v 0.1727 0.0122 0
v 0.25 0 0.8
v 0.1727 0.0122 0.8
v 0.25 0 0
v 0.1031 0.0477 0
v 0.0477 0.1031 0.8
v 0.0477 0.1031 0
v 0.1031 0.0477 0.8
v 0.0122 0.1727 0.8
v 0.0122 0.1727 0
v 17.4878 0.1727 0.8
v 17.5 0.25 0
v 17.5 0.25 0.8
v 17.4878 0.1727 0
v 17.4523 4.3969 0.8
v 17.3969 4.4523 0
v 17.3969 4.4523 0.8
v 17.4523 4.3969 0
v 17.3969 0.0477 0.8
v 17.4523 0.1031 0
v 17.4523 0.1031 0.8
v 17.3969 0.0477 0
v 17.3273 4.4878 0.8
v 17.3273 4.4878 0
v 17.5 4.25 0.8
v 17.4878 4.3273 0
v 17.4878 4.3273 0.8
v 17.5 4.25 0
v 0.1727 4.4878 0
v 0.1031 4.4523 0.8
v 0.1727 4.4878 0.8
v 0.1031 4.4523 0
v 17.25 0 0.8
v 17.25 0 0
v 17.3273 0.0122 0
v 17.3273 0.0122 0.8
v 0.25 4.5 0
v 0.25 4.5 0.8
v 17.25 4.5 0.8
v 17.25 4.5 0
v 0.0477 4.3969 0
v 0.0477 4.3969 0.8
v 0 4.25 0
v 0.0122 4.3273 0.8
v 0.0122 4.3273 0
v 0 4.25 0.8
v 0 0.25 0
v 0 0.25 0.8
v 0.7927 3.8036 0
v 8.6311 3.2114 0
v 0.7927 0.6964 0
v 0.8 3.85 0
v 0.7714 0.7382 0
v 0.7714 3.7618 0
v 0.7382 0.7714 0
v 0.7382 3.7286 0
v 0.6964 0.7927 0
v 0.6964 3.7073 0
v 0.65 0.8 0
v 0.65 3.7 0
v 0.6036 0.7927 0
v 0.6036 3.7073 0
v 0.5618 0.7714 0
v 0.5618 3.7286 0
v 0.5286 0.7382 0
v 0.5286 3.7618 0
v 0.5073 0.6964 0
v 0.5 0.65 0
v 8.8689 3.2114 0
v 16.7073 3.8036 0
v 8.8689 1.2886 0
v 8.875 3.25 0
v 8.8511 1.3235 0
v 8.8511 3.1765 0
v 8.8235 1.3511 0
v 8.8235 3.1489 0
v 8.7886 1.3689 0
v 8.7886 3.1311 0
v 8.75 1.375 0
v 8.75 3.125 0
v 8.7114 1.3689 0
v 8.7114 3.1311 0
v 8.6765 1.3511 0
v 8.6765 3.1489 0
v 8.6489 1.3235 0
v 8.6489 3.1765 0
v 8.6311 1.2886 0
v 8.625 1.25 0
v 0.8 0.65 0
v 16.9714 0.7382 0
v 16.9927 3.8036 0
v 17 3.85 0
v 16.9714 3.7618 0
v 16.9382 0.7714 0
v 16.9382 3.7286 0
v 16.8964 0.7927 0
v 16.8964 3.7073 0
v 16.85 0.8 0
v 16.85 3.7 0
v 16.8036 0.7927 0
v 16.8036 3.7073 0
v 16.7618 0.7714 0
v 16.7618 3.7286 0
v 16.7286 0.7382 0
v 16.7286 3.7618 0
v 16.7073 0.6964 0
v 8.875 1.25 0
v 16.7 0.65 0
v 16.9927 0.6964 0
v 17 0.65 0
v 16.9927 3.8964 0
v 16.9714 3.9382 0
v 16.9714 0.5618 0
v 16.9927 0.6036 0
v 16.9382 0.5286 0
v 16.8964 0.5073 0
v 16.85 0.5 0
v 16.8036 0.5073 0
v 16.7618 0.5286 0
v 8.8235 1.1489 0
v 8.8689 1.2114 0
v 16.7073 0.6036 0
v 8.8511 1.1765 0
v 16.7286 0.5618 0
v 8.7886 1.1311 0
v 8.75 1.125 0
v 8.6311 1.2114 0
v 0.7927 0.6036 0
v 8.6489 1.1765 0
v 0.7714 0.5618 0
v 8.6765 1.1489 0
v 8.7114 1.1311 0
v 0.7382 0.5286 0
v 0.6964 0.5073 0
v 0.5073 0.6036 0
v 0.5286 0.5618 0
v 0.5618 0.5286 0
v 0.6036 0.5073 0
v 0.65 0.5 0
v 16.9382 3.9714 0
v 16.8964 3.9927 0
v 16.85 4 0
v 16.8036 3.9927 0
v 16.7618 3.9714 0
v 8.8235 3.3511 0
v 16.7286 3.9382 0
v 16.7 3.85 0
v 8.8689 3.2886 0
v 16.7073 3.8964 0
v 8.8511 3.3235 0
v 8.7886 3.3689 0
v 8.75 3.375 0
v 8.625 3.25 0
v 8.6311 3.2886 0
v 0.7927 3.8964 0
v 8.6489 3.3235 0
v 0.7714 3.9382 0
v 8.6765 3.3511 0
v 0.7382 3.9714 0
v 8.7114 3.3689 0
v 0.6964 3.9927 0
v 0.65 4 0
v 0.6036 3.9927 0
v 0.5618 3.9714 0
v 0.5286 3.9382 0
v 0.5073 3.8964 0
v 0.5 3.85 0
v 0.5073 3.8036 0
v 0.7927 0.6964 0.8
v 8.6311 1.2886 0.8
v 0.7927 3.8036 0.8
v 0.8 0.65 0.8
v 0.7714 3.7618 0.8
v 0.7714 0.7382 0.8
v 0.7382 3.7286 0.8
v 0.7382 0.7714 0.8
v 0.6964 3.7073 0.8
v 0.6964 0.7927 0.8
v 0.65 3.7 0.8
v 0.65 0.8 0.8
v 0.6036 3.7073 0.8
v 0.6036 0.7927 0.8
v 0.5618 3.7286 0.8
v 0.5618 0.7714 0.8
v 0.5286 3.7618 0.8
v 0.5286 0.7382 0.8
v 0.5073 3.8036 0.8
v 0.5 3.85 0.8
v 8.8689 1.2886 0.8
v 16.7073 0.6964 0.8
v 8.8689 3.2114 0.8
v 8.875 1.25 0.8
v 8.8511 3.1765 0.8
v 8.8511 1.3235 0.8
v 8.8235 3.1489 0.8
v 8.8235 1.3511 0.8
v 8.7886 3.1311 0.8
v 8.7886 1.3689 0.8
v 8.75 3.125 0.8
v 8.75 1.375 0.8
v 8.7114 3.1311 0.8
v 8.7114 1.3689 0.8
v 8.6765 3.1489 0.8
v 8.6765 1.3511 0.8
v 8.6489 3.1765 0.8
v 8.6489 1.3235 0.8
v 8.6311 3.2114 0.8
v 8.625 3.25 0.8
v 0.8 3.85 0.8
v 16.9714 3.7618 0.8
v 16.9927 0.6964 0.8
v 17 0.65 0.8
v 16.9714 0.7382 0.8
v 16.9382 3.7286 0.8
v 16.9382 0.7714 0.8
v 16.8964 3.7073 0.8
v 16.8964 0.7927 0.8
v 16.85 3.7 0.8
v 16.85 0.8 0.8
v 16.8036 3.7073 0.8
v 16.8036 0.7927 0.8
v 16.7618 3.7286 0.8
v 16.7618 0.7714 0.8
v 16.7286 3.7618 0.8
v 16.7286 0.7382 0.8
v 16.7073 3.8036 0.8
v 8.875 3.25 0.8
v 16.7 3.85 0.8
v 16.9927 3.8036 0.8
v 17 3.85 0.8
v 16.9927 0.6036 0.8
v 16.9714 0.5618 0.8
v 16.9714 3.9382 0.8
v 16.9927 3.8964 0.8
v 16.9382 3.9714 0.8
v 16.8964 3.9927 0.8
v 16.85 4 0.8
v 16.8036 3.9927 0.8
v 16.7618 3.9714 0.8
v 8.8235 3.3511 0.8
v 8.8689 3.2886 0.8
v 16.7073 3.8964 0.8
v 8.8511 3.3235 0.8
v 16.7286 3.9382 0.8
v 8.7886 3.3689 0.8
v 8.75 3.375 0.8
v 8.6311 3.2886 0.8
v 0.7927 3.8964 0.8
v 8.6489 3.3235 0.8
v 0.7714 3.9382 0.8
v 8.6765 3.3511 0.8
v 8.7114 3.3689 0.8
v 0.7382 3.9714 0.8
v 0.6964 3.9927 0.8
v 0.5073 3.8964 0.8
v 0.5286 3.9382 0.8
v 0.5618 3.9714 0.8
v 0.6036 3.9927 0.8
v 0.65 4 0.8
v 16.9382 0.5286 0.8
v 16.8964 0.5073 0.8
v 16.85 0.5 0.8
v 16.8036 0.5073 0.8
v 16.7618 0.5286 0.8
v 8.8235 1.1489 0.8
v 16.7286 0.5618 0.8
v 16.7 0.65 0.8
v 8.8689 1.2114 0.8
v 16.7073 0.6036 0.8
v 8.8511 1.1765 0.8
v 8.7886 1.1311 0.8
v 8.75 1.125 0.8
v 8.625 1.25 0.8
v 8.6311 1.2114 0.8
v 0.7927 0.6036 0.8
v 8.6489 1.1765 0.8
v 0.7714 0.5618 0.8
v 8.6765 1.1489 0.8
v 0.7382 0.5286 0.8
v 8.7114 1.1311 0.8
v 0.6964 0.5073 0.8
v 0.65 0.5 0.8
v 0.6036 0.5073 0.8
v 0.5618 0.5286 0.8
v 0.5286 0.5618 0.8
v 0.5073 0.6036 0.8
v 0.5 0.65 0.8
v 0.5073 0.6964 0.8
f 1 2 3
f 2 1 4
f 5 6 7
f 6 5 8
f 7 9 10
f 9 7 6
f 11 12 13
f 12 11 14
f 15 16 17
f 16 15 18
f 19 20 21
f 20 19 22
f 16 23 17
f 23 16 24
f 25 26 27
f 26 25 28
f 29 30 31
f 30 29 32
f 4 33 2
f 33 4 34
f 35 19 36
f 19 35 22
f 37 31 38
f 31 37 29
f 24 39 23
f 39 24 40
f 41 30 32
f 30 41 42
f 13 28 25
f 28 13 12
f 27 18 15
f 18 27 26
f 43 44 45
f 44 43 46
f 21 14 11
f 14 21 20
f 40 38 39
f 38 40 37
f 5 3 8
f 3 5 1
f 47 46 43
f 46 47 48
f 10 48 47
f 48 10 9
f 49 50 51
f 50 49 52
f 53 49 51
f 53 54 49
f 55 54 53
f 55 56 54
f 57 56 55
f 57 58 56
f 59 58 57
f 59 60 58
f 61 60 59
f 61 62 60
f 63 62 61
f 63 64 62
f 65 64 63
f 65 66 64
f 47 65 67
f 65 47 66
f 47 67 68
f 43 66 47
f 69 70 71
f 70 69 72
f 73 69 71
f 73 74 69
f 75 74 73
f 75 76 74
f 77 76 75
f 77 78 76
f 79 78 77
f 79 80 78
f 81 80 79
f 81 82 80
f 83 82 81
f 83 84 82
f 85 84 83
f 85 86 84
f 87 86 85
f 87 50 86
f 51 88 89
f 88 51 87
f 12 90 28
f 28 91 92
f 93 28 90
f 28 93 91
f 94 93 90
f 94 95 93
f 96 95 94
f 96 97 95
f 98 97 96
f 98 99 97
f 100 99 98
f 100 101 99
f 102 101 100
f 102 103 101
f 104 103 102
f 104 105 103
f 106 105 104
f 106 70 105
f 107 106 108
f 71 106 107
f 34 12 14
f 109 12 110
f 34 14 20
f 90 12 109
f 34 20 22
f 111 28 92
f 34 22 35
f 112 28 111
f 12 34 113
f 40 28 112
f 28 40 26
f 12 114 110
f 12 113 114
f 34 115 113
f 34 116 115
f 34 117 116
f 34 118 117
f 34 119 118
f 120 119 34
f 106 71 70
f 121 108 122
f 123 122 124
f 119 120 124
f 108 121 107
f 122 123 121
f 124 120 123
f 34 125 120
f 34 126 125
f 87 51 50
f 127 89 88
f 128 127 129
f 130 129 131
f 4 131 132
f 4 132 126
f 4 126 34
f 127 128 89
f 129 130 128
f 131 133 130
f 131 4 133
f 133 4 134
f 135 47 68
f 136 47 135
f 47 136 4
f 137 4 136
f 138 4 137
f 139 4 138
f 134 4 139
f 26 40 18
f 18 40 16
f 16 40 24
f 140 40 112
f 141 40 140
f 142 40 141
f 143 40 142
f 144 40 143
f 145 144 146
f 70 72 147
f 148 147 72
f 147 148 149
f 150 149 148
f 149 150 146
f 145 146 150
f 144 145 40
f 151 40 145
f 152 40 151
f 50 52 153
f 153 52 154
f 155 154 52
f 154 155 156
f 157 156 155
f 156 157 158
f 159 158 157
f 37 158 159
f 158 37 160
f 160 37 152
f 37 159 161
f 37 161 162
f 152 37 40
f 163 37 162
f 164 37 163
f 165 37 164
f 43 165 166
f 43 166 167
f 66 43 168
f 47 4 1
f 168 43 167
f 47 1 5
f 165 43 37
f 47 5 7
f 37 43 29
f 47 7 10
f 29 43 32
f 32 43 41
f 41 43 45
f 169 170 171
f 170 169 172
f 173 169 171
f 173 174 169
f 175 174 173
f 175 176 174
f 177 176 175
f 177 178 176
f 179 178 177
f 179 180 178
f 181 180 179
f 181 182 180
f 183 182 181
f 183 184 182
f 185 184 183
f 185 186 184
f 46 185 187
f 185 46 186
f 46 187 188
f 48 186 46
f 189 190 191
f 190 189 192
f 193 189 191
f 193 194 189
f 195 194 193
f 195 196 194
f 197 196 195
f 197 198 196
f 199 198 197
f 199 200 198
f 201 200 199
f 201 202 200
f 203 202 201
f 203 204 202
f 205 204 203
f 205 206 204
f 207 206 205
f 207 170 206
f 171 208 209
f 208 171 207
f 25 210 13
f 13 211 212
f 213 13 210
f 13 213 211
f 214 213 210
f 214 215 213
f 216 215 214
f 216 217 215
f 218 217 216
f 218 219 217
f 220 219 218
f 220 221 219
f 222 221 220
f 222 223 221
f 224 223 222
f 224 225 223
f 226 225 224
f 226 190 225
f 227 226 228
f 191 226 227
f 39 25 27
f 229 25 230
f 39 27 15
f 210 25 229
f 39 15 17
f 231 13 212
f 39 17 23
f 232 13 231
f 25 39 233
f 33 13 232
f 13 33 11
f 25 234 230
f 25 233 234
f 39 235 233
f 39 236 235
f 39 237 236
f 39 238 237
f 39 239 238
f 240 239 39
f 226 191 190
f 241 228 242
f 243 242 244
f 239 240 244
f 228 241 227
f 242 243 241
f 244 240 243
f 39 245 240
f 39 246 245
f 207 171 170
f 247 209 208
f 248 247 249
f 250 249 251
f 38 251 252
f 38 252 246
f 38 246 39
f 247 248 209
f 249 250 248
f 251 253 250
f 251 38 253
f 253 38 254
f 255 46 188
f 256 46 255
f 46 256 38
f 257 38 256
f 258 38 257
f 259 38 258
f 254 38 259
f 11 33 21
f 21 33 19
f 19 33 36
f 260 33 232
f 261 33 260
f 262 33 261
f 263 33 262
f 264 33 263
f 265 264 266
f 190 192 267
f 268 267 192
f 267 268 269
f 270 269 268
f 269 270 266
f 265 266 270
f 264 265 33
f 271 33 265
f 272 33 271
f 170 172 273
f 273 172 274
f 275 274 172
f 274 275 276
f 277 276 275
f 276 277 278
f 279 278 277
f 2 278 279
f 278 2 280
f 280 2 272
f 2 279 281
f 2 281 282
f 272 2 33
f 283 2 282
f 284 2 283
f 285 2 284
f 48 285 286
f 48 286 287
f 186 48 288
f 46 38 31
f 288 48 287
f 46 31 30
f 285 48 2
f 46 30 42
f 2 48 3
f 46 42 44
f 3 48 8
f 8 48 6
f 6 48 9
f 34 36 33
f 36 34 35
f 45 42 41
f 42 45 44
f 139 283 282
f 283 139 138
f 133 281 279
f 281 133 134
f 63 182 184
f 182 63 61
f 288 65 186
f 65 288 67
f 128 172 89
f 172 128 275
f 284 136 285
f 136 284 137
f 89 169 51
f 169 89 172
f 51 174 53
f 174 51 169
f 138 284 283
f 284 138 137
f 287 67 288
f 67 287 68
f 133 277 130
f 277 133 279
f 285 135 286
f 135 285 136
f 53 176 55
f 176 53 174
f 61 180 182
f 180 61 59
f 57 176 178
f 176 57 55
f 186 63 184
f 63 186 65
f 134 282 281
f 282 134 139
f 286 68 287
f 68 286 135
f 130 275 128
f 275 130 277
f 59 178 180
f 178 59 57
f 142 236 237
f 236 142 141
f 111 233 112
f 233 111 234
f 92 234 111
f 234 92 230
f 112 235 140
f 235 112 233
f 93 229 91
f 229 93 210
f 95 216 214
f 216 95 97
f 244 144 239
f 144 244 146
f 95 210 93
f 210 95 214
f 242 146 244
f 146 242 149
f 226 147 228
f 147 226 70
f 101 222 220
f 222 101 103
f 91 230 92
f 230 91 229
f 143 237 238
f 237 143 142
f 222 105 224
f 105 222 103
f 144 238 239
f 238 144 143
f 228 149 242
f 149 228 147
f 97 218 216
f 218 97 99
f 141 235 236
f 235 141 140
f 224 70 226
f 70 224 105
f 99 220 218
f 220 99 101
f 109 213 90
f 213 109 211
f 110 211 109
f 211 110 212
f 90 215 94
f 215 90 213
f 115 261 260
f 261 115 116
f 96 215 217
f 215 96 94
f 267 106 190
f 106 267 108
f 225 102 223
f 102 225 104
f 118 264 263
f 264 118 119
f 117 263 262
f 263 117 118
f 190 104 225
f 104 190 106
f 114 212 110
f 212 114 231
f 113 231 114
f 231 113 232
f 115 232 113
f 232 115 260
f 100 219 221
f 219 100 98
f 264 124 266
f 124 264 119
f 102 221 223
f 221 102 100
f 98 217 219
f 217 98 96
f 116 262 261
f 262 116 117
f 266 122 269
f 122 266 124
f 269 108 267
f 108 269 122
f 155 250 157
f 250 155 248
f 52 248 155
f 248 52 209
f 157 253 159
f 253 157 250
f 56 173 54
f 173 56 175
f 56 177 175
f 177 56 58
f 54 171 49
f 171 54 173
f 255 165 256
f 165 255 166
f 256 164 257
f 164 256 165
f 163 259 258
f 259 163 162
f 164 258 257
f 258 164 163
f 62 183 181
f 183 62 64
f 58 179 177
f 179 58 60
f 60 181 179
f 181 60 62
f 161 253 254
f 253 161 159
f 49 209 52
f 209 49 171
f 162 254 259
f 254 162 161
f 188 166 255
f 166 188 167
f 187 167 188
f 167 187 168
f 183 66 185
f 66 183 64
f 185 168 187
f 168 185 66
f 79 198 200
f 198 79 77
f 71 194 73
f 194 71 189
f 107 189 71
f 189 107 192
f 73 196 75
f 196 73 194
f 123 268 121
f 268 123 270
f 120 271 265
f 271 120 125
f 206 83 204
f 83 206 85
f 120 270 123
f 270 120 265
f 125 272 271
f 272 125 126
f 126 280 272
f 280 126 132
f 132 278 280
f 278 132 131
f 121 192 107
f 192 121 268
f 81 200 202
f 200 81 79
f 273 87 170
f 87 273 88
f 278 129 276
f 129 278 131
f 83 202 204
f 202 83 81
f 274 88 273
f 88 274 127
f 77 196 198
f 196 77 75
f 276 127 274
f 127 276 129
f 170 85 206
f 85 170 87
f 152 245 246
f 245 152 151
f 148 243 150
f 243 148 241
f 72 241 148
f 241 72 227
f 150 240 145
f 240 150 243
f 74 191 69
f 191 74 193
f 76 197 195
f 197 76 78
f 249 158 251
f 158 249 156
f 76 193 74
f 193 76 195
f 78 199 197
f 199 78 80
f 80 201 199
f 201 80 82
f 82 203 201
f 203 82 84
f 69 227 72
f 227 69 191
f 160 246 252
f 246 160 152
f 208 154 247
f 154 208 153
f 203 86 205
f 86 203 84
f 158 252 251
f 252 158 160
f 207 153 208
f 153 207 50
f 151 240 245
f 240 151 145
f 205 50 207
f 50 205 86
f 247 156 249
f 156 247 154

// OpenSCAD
$fn = 20;

/**
 * Source file for the 3D printed support for the balancing robot.
 * All dimensions are in centimeters, manually measured!
 */

bot_width = 17.50;
bot_height = .8;
bot_depth = 4.50;

// Padding around the edge of the board.
padding = .5;

// Size of the 4 screw holes
hole_radius = .3 / 2;

// Stepper motor sizings
motor_width = 2.5;
motor_depth = 4;

// Size of the battery pack
battery_width = 7.5;
battery_depth = 4;
battery_height = 2;
battery_hole_radius = .25 / 2;
battery_hole_spacing = 2;

difference() {
    // Base plate
    color("#6c71c4") hull() {
        corner_radius = .25;
        translate([ corner_radius, corner_radius, 0])
            cylinder(h=bot_height, r = corner_radius);
        translate([ bot_width - corner_radius, corner_radius, 0 ])
            cylinder(h=bot_height, r = corner_radius);
        translate([ corner_radius, bot_depth - corner_radius, 0])
            cylinder(h=bot_height, r = corner_radius);
        translate([ bot_width - corner_radius, bot_depth - corner_radius, 0])
            cylinder(h=bot_height, r = corner_radius);
    }
      
    // 4 holes that align with the breadboard.
    translate([padding + hole_radius, padding + hole_radius, 0])
        cylinder(h = bot_height, r=hole_radius);
    translate([bot_width - padding - hole_radius, bot_depth - padding - hole_radius, 0])
        cylinder(h = bot_height, r=hole_radius);
    translate([bot_width - padding - hole_radius, padding + hole_radius, 0])
        cylinder(h = bot_height, r=hole_radius);
    translate([padding + hole_radius, bot_depth - padding - hole_radius, 0])
        cylinder(h = bot_height, r=hole_radius);

    // 2 sidebars where we can latch things to
//    sidebar_width = 8;
//    sidebar_depth = hole_radius;
//    sidebar_offset = bot_width / 2 - sidebar_width / 2;
//    translate([sidebar_offset, padding, 0])
//        cube([sidebar_width, sidebar_depth, bot_height]);
//    translate([sidebar_offset, bot_depth - padding - sidebar_depth, 0])
//        cube([sidebar_width, sidebar_depth, bot_height]);
        
    // Battery holes
    translate([bot_width/2, bot_depth / 2 - (battery_hole_spacing / 2), 0])
        cylinder(h = bot_height, r = battery_hole_radius);
    translate([bot_width/2, bot_depth / 2 + (battery_hole_spacing / 2), 0])
        cylinder(h = bot_height, r = battery_hole_radius);
}

// Motors, battery packs
%union() {
    translate([1.5, (bot_depth - motor_depth) / 2, bot_height])
        cube([motor_width, motor_depth, motor_depth]);
    
    translate([bot_width - motor_width -1.5, (bot_depth - motor_depth) / 2, bot_height])
        cube([motor_width, motor_depth, motor_depth]);
    
    translate([(bot_width - battery_width) / 2, (bot_depth - battery_depth) / 2, bot_height])
        cube([battery_width, battery_depth, battery_height]);
}
